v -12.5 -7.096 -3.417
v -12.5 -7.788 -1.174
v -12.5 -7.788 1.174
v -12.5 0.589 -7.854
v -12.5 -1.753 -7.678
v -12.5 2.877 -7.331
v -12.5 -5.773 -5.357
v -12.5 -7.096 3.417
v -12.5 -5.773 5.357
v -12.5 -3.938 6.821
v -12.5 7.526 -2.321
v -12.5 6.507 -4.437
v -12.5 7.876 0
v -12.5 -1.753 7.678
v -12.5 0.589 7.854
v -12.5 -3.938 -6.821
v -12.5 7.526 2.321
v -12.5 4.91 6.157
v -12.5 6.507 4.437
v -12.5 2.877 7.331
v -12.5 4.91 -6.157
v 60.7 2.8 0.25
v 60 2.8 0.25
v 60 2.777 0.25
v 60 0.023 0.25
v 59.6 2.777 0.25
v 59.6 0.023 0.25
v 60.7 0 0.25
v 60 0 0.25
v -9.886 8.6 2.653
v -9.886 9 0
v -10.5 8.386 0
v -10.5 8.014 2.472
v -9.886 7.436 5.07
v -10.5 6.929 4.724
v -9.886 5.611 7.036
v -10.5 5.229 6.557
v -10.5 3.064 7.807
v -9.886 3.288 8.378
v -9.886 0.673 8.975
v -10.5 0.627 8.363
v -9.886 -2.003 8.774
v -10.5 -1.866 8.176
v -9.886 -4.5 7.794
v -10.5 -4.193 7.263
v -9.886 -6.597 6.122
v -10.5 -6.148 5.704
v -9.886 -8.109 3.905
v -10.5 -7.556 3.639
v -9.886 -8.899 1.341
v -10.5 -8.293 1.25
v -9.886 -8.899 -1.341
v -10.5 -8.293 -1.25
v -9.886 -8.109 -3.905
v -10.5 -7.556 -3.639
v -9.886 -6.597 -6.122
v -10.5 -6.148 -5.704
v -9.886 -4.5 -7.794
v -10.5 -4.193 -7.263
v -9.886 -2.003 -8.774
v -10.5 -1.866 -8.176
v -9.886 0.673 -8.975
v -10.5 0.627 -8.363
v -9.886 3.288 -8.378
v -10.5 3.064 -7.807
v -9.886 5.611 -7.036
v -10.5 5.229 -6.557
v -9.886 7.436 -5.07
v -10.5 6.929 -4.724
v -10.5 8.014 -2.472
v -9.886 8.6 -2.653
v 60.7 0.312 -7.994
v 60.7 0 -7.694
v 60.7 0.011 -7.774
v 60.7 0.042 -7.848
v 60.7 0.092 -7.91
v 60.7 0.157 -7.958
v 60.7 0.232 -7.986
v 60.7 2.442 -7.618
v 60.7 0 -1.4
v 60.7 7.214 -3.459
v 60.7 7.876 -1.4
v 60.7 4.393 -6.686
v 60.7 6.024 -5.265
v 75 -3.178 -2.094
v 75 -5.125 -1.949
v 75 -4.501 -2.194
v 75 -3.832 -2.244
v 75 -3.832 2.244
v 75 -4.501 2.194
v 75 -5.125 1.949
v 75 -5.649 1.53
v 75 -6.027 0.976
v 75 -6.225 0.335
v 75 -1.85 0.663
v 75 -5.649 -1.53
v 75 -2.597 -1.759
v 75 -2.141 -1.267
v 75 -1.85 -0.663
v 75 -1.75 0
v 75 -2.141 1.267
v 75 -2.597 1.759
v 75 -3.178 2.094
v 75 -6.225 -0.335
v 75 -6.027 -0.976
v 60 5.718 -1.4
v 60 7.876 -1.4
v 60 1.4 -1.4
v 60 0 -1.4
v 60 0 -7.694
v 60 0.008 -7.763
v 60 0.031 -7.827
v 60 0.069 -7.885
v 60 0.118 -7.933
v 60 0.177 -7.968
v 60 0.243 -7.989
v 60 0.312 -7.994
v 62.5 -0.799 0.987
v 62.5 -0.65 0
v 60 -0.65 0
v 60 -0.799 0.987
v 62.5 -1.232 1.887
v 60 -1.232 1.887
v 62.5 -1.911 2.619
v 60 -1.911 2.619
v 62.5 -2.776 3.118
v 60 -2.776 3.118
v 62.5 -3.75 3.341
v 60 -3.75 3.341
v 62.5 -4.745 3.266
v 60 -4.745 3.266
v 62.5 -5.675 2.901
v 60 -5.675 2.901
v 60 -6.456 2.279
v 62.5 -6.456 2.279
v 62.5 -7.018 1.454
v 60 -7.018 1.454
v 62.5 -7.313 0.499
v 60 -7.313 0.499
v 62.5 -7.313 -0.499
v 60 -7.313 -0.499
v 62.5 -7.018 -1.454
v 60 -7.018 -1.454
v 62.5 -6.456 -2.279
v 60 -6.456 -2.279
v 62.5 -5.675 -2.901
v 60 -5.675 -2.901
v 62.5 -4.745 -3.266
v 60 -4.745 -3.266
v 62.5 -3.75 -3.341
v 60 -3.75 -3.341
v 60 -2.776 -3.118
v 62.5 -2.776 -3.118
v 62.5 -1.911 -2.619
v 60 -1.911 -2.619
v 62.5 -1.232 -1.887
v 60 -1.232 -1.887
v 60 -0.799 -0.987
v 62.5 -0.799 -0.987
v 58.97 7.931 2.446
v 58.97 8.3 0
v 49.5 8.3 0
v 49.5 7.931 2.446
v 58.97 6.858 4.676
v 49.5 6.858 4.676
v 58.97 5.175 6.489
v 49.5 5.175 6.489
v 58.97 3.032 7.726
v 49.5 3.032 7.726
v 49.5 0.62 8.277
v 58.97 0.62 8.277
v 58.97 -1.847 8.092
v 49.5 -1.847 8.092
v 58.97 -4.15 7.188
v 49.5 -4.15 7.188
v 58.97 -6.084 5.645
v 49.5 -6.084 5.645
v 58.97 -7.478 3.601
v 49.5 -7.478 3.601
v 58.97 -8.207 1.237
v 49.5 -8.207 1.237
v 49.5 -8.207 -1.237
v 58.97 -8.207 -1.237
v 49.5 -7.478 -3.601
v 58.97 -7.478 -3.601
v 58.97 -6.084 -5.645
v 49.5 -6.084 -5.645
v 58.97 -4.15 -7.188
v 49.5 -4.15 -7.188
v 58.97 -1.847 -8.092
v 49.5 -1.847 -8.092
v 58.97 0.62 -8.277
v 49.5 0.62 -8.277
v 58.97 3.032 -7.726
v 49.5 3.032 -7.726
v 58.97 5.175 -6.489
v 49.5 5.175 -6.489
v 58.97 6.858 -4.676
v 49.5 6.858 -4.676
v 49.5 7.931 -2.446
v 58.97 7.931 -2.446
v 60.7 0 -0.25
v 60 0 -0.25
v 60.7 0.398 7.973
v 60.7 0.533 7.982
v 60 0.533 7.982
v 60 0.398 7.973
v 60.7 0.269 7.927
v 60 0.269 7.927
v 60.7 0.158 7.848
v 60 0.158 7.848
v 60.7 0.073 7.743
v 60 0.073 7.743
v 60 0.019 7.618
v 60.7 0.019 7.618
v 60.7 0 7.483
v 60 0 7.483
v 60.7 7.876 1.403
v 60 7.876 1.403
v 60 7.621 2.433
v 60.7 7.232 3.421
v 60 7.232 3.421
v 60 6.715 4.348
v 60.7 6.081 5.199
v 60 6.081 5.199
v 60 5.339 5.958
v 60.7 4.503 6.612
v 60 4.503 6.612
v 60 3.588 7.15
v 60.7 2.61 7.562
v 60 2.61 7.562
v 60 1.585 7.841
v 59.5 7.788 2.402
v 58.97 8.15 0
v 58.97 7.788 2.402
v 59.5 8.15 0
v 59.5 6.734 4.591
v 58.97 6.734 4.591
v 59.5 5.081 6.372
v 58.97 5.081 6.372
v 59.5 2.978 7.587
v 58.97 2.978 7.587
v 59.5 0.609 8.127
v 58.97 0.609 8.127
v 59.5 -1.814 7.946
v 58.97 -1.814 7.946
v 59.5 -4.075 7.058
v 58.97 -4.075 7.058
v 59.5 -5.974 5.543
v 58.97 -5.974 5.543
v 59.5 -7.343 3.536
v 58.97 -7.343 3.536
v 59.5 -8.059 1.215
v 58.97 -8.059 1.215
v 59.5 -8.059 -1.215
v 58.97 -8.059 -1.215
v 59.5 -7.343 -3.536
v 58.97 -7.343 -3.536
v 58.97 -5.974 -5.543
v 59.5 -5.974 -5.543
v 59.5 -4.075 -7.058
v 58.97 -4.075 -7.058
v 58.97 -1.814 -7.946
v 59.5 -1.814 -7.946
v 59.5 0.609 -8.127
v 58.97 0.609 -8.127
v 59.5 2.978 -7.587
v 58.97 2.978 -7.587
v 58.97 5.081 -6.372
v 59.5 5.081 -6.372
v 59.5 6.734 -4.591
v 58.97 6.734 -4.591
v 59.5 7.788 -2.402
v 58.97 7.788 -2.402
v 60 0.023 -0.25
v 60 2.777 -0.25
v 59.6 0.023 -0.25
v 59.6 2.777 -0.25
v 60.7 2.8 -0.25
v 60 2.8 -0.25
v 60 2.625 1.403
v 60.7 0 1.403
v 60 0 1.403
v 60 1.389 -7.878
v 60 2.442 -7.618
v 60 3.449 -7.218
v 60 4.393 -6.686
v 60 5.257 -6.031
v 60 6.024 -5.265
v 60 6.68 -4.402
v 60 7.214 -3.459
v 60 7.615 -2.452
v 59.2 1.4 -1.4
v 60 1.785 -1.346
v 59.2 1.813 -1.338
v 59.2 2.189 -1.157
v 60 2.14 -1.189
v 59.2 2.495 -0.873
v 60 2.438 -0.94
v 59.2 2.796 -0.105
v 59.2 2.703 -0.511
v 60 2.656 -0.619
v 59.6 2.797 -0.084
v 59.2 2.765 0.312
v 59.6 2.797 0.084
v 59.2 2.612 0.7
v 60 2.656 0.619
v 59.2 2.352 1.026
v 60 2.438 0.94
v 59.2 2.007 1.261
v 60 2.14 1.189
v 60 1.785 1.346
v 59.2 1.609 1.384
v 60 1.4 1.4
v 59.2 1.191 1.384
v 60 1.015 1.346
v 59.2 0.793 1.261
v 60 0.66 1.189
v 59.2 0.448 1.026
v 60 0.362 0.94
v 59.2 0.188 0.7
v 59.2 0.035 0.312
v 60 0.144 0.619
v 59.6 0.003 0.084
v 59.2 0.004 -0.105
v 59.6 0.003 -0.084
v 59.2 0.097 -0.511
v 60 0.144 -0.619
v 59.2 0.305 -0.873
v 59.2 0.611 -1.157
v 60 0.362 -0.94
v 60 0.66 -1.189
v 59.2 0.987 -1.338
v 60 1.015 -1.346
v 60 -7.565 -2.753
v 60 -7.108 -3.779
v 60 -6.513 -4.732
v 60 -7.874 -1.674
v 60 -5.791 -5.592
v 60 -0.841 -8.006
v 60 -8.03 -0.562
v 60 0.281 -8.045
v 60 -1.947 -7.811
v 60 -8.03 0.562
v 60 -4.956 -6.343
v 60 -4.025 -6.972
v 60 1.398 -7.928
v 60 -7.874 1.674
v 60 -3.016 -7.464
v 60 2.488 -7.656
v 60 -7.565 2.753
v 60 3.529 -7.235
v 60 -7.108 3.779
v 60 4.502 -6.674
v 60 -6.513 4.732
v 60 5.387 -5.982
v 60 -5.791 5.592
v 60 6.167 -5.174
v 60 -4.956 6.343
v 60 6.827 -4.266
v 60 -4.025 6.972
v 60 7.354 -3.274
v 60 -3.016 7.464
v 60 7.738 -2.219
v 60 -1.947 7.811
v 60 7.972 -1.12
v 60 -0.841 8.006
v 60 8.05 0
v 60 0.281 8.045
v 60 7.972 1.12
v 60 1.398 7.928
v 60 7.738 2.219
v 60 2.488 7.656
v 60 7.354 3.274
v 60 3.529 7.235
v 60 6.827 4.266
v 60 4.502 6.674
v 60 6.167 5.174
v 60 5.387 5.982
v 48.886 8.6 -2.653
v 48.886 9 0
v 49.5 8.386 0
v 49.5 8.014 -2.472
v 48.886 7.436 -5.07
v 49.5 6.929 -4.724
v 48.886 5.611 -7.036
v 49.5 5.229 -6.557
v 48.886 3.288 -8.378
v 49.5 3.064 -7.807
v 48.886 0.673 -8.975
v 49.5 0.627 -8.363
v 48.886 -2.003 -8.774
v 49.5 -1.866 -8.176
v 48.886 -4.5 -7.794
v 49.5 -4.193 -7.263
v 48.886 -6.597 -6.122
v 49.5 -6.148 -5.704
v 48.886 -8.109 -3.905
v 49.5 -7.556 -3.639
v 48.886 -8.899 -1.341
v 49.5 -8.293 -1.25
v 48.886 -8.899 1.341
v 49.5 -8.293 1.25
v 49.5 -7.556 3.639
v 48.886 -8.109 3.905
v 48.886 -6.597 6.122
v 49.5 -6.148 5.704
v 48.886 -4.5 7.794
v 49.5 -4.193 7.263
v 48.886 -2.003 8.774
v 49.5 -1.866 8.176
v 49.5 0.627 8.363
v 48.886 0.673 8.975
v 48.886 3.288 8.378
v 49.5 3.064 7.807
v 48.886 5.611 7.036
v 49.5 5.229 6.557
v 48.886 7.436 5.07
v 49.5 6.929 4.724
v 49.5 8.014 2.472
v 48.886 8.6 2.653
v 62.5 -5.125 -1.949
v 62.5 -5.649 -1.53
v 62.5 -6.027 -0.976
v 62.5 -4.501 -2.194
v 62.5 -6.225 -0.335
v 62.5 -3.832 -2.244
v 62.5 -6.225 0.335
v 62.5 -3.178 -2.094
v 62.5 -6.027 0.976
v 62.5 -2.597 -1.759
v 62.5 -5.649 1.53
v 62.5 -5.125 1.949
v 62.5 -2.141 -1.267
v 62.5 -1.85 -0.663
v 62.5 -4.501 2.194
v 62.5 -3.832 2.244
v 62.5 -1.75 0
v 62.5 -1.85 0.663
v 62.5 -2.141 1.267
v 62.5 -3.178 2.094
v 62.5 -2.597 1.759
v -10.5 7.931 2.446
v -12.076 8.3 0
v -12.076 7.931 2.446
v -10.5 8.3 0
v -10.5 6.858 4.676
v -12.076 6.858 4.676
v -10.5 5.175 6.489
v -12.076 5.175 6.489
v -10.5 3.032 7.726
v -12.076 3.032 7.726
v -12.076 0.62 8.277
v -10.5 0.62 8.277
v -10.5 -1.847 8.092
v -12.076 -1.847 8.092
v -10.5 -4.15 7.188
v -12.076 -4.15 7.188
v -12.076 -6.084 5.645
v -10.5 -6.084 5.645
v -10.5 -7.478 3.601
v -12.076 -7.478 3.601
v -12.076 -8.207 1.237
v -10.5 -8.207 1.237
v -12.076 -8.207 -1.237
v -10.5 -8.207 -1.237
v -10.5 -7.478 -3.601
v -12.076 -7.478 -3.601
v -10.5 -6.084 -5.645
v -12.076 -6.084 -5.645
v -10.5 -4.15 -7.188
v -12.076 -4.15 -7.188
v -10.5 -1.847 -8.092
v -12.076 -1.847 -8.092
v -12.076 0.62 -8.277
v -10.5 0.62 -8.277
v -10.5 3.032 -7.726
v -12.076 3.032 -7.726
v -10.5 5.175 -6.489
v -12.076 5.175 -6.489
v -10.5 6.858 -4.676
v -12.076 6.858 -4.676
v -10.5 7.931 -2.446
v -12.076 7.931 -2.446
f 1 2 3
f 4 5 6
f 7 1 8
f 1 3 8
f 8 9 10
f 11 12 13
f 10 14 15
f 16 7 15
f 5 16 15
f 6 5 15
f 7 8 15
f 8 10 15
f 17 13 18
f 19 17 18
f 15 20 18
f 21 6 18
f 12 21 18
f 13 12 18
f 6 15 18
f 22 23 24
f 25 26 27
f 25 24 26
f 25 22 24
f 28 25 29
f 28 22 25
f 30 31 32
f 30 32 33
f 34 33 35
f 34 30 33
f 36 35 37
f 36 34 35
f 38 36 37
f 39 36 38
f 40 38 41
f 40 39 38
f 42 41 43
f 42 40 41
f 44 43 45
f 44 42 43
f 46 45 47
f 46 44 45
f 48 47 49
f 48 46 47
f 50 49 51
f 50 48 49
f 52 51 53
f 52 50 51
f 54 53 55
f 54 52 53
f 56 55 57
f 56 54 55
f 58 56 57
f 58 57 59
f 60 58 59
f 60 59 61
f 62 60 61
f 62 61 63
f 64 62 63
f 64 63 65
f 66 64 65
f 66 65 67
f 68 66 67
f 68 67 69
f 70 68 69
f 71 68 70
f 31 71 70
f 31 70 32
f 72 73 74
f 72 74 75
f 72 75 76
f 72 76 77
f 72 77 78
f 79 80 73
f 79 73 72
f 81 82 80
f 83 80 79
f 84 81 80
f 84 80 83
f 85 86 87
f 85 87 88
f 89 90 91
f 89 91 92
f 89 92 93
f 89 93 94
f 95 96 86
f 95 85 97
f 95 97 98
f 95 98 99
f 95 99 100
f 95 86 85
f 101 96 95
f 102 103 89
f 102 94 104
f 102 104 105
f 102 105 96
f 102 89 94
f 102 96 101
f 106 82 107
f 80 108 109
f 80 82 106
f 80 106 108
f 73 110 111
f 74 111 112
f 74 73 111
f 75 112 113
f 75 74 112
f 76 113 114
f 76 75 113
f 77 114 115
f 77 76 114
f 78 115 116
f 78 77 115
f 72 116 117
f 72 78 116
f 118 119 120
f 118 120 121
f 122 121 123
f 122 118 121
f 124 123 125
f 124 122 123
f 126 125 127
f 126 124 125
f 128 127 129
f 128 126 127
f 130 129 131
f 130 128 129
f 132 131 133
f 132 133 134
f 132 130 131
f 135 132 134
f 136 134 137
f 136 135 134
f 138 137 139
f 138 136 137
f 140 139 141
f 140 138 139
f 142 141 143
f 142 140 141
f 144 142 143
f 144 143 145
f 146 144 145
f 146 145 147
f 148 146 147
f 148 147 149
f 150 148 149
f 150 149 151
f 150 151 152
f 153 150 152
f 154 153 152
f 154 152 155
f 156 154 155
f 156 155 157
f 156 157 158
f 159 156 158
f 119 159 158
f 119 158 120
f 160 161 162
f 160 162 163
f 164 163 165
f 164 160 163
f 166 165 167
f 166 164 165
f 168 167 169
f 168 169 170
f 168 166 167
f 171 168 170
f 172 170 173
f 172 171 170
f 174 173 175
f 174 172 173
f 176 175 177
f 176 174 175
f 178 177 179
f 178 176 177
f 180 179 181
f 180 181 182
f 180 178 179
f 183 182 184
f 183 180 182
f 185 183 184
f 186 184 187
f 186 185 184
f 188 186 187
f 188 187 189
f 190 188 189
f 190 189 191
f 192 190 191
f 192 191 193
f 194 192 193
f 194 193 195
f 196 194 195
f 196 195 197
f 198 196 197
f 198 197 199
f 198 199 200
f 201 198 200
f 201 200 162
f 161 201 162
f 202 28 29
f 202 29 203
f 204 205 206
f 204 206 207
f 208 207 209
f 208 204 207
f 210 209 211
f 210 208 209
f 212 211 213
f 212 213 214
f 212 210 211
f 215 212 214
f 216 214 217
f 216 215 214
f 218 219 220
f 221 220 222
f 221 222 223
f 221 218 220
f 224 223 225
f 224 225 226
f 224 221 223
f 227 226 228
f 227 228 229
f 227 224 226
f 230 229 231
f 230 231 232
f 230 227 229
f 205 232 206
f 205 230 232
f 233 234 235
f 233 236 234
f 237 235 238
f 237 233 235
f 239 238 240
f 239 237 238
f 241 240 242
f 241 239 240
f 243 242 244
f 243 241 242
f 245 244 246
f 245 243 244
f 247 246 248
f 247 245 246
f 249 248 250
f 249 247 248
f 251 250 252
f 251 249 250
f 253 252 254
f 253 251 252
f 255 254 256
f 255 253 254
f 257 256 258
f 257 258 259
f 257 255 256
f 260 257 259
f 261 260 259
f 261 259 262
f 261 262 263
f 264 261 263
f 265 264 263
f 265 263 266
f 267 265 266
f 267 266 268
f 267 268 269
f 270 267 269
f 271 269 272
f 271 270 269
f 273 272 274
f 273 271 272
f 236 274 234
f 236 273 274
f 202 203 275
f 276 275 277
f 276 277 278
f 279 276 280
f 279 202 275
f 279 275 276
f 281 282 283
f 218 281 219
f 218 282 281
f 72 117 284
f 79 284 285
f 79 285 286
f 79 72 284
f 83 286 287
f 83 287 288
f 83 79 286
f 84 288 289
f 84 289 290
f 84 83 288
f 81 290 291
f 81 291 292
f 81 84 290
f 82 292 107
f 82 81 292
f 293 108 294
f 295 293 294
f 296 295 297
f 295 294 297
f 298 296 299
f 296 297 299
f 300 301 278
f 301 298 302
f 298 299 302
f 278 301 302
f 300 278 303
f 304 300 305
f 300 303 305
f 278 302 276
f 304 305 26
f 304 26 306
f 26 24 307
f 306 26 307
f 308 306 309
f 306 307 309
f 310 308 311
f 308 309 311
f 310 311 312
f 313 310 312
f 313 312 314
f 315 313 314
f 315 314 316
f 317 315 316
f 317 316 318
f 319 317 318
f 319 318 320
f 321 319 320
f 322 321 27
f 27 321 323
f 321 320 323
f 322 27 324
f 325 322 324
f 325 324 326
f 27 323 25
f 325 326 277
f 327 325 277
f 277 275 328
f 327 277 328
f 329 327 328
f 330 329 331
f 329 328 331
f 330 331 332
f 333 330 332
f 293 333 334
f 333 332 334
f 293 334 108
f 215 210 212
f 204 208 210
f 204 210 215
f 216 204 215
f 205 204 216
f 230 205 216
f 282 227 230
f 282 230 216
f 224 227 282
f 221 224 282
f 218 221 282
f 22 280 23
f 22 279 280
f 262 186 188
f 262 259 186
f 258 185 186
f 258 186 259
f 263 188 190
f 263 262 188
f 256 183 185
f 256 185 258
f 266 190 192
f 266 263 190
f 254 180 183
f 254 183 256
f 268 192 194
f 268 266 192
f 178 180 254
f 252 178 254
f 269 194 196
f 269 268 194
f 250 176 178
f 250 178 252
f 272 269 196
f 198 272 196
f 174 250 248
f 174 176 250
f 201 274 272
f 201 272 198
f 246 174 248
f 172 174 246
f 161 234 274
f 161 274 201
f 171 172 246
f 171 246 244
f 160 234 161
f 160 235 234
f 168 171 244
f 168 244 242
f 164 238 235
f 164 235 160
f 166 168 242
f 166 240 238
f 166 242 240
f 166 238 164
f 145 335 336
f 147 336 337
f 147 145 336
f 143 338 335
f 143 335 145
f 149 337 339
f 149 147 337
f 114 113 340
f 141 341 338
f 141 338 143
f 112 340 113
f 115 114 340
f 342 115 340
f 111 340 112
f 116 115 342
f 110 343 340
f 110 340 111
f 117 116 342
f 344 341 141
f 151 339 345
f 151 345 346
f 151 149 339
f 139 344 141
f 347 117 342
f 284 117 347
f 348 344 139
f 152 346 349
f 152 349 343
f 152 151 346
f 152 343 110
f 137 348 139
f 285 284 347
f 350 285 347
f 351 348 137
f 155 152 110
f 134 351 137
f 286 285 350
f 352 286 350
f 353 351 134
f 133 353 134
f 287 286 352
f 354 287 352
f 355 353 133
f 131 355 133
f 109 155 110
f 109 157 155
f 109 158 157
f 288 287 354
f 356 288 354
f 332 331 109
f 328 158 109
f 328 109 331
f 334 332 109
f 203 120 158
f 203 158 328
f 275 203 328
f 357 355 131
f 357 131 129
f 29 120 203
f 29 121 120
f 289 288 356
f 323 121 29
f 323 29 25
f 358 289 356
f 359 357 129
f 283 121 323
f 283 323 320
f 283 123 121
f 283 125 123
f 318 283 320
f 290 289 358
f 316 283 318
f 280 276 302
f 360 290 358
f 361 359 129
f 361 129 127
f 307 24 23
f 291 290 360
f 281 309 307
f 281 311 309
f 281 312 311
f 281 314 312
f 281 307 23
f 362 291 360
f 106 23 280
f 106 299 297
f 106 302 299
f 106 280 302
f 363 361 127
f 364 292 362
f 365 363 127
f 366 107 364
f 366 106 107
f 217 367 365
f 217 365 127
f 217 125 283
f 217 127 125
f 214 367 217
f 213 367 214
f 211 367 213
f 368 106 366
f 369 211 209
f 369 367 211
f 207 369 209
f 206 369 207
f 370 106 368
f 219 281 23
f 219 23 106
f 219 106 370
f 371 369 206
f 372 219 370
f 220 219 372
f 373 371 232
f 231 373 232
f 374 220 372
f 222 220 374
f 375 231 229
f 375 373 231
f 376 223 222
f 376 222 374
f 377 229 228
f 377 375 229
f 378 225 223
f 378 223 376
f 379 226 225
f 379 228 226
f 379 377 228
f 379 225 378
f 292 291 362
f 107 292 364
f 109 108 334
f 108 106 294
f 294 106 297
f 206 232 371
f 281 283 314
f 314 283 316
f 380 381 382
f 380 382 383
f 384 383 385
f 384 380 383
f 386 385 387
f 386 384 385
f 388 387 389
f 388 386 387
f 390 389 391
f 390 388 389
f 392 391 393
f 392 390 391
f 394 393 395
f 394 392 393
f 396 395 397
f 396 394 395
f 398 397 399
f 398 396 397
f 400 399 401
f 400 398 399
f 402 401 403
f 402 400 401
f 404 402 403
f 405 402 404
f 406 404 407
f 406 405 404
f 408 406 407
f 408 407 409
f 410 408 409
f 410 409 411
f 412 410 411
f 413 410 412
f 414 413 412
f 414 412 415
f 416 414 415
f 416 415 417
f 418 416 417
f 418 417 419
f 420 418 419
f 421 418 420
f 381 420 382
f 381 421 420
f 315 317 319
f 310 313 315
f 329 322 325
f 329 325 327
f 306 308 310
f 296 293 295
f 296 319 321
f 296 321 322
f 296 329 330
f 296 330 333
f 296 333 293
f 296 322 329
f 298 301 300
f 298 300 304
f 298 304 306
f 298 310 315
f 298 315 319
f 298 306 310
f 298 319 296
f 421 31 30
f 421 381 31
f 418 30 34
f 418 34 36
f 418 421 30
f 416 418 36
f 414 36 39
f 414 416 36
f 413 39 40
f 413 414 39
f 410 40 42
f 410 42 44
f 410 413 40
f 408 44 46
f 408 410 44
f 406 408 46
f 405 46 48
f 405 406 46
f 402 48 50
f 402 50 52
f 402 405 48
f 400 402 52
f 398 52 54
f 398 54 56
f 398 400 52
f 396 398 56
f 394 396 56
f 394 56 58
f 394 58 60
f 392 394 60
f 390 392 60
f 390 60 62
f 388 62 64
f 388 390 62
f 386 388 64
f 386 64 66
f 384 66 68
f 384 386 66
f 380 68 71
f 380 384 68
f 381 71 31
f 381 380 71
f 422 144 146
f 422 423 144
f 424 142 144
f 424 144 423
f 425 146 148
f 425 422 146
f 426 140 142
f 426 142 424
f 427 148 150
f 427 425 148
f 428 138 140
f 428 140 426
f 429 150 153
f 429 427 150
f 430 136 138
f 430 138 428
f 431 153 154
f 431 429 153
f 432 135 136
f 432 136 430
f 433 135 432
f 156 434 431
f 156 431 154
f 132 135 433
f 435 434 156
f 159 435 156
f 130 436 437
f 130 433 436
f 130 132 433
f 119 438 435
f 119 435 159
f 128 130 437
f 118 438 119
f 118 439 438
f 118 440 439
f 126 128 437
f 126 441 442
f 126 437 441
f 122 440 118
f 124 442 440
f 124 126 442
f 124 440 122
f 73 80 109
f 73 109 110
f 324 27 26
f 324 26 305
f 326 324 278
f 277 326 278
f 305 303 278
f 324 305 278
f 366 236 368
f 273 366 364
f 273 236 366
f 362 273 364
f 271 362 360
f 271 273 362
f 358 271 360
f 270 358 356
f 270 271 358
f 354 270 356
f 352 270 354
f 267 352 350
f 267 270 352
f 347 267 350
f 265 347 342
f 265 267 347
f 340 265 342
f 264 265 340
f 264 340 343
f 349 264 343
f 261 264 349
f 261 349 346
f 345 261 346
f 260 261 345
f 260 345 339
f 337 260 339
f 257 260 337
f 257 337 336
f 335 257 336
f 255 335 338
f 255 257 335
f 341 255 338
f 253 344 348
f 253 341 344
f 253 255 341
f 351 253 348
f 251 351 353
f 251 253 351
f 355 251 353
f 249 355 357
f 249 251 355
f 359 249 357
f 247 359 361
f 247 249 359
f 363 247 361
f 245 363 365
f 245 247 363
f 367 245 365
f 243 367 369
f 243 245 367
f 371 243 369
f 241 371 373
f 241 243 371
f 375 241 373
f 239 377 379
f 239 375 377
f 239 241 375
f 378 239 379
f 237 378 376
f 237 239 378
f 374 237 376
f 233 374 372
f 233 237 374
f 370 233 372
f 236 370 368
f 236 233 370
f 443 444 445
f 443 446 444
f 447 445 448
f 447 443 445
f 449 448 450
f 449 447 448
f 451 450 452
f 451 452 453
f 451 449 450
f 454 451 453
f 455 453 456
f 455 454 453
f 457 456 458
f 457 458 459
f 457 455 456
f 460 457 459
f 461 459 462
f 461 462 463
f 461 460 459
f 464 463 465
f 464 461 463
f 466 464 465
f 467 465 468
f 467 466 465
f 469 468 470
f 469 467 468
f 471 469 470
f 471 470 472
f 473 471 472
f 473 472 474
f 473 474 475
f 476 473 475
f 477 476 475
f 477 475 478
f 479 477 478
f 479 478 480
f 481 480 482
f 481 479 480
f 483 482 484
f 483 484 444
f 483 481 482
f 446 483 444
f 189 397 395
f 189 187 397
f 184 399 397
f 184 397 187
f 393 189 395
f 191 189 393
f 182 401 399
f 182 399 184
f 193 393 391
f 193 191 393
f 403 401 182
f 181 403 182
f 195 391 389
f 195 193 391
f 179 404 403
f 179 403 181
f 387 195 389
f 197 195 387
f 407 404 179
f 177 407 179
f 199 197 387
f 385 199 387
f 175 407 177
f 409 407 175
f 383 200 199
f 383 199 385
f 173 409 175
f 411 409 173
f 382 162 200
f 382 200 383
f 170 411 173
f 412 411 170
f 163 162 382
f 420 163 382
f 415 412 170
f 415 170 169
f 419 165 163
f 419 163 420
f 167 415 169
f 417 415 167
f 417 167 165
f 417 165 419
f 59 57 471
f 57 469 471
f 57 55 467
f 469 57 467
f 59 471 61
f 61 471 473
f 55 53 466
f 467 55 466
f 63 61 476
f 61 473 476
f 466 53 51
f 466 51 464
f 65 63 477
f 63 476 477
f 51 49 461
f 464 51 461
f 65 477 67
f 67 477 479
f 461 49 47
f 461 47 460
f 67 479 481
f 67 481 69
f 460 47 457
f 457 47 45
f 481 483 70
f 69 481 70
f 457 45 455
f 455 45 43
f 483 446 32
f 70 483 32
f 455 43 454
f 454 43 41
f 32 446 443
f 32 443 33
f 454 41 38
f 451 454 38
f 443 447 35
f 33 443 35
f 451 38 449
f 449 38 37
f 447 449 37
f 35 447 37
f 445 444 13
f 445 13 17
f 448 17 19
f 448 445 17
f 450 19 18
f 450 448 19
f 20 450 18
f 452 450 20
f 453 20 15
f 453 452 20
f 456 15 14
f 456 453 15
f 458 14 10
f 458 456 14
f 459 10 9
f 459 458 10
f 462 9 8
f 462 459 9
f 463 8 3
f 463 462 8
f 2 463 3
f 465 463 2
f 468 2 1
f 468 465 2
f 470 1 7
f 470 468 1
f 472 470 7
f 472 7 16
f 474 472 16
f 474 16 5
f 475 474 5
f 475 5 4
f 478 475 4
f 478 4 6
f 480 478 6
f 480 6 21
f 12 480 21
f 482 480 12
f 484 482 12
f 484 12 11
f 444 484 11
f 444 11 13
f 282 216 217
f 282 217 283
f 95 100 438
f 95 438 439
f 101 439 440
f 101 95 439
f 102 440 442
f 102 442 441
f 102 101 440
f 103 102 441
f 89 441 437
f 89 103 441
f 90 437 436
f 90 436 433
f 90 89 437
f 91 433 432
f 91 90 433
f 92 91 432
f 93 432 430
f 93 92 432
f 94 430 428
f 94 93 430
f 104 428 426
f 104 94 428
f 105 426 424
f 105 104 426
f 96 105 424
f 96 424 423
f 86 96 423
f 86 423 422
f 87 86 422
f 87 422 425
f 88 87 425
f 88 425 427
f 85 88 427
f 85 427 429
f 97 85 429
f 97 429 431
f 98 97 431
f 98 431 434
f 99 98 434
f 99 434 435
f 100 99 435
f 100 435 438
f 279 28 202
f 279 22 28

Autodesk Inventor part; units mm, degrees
sketch "Sketch_1" plane through (0, 0, 0) normal (0, 0, 1) x (1, 0, 0)
  line L0 (60, 0) -> (-12.5, 0)
  line L1 (-12.5, 0) -> (-12.5, 7.8757)
  line L2 (-12.5, 7.8757) -> (-12.0757, 8.3)
  line L3 (-12.0757, 8.3) -> (-10.5, 8.3)
  line L4 (-10.5, 8.3) -> (-10.5, 8.3865)
  line L5 (-10.5, 8.3865) -> (-9.8865, 9)
  line L6 (-9.8865, 9) -> (48.8865, 9)
  line L7 (48.8865, 9) -> (49.5, 8.3865)
  line L8 (49.5, 8.3865) -> (49.5, 8.3)
  line L9 (49.5, 8.3) -> (58.97, 8.3)
  line L10 (58.97, 8.3) -> (58.97, 8.15)
  line L11 (58.97, 8.15) -> (59.5, 8.15)
  line L12 (59.5, 8.15) -> (60, 8.05)
  line L13 (60, 8.05) -> (60, 0)
  line L14 (60, 0) -> (-12.5, 0)
revolve "Revolution1" add sketch "Sketch_1" angle 360 about axis through (60, 0, 0) along (1, 0, 0)
thread "Thread1" size "M18x1" class "6g" standard "ISO Metric profile" full length
sketch "Sketch_2" plane through (0, 0, 0) normal (0, 0, 1) x (1, 0, 0)
  line L0 (75, -4) -> (60, -4)
  line L1 (60, -4) -> (60, -0.65)
  line L2 (60, -0.65) -> (62.5, -0.65)
  line L3 (62.5, -0.65) -> (62.5, -1.75)
  line L4 (62.5, -1.75) -> (75, -1.75)
  line L5 (75, -1.75) -> (75, -4)
  line L6 (75, -4) -> (60, -4)
revolve "Revolution2" add sketch "Sketch_2" angle 360 about axis through (75, -4, 0) along (1, 0, 0)
sketch "Sketch_5" plane through (60.7, 0, 0) normal (1, 0, 0) x (0, 0, -1)
  line L0 (1.4, 7.8765) -> (1.4, 0)
  line L1 (1.4, 0) -> (7.6942, 0)
  arc A0 (7.6942, 0) -> (7.9939, 0.3117) centre (7.6942, 0.3) ccw
  arc A1 (7.9939, 0.3117) -> (1.4, 7.8765) centre (0, 0) ccw
extrude "Extrusion1" add sketch "Sketch_5" against normal blind 0.7
sketch "Sketch_9" plane through (60.7, 0, 0) normal (1, 0, 0) x (0, 0, -1)
  arc A0 (-7.9822, 0.5333) -> (-7.4833, 0) centre (-7.4833, 0.5) ccw
  line L0 (-7.4833, 0) -> (-1.4026, 0)
  line L1 (-1.4026, 0) -> (-1.4026, 7.8761)
  arc A1 (-1.4026, 7.8761) -> (-7.9822, 0.5333) centre (0, 0) ccw
extrude "Extrusion2" add sketch "Sketch_9" against normal blind 0.7
sketch "Sketch_10" plane through (60.7, 0, 0) normal (1, 0, 0) x (0, 0, -1)
  circle A0 centre (0, 1.4) radius 1.4
extrude "Extrusion3" cut sketch "Sketch_10" against normal blind 1.5
sketch "Sketch_6" plane through (60.7, 0, 0) normal (1, 0, 0) x (0, 0, -1)
  line L0 (-0.25, 0) -> (0.25, 0)
  line L1 (0.25, 0) -> (0.25, 2.8)
  line L2 (0.25, 2.8) -> (-0.25, 2.8)
  line L3 (-0.25, 2.8) -> (-0.25, 0)
extrude "Extrusion4" add sketch "Sketch_6" against normal blind 1.1
ref_plane "ip1_XY" through (0, 0, 0) normal (1, 0, 0) x (0, 0, -1)
ref_plane "ip1_YZ" through (0, 0, 0) normal (0, 0, -1) x (0, 1, 0)
ref_plane "ip1_ZX" through (0, 0, 0) normal (0, 1, 0) x (1, 0, 0)
properties part number "BALLUFF BCS M18BBN1-PSC80D-EP021"
